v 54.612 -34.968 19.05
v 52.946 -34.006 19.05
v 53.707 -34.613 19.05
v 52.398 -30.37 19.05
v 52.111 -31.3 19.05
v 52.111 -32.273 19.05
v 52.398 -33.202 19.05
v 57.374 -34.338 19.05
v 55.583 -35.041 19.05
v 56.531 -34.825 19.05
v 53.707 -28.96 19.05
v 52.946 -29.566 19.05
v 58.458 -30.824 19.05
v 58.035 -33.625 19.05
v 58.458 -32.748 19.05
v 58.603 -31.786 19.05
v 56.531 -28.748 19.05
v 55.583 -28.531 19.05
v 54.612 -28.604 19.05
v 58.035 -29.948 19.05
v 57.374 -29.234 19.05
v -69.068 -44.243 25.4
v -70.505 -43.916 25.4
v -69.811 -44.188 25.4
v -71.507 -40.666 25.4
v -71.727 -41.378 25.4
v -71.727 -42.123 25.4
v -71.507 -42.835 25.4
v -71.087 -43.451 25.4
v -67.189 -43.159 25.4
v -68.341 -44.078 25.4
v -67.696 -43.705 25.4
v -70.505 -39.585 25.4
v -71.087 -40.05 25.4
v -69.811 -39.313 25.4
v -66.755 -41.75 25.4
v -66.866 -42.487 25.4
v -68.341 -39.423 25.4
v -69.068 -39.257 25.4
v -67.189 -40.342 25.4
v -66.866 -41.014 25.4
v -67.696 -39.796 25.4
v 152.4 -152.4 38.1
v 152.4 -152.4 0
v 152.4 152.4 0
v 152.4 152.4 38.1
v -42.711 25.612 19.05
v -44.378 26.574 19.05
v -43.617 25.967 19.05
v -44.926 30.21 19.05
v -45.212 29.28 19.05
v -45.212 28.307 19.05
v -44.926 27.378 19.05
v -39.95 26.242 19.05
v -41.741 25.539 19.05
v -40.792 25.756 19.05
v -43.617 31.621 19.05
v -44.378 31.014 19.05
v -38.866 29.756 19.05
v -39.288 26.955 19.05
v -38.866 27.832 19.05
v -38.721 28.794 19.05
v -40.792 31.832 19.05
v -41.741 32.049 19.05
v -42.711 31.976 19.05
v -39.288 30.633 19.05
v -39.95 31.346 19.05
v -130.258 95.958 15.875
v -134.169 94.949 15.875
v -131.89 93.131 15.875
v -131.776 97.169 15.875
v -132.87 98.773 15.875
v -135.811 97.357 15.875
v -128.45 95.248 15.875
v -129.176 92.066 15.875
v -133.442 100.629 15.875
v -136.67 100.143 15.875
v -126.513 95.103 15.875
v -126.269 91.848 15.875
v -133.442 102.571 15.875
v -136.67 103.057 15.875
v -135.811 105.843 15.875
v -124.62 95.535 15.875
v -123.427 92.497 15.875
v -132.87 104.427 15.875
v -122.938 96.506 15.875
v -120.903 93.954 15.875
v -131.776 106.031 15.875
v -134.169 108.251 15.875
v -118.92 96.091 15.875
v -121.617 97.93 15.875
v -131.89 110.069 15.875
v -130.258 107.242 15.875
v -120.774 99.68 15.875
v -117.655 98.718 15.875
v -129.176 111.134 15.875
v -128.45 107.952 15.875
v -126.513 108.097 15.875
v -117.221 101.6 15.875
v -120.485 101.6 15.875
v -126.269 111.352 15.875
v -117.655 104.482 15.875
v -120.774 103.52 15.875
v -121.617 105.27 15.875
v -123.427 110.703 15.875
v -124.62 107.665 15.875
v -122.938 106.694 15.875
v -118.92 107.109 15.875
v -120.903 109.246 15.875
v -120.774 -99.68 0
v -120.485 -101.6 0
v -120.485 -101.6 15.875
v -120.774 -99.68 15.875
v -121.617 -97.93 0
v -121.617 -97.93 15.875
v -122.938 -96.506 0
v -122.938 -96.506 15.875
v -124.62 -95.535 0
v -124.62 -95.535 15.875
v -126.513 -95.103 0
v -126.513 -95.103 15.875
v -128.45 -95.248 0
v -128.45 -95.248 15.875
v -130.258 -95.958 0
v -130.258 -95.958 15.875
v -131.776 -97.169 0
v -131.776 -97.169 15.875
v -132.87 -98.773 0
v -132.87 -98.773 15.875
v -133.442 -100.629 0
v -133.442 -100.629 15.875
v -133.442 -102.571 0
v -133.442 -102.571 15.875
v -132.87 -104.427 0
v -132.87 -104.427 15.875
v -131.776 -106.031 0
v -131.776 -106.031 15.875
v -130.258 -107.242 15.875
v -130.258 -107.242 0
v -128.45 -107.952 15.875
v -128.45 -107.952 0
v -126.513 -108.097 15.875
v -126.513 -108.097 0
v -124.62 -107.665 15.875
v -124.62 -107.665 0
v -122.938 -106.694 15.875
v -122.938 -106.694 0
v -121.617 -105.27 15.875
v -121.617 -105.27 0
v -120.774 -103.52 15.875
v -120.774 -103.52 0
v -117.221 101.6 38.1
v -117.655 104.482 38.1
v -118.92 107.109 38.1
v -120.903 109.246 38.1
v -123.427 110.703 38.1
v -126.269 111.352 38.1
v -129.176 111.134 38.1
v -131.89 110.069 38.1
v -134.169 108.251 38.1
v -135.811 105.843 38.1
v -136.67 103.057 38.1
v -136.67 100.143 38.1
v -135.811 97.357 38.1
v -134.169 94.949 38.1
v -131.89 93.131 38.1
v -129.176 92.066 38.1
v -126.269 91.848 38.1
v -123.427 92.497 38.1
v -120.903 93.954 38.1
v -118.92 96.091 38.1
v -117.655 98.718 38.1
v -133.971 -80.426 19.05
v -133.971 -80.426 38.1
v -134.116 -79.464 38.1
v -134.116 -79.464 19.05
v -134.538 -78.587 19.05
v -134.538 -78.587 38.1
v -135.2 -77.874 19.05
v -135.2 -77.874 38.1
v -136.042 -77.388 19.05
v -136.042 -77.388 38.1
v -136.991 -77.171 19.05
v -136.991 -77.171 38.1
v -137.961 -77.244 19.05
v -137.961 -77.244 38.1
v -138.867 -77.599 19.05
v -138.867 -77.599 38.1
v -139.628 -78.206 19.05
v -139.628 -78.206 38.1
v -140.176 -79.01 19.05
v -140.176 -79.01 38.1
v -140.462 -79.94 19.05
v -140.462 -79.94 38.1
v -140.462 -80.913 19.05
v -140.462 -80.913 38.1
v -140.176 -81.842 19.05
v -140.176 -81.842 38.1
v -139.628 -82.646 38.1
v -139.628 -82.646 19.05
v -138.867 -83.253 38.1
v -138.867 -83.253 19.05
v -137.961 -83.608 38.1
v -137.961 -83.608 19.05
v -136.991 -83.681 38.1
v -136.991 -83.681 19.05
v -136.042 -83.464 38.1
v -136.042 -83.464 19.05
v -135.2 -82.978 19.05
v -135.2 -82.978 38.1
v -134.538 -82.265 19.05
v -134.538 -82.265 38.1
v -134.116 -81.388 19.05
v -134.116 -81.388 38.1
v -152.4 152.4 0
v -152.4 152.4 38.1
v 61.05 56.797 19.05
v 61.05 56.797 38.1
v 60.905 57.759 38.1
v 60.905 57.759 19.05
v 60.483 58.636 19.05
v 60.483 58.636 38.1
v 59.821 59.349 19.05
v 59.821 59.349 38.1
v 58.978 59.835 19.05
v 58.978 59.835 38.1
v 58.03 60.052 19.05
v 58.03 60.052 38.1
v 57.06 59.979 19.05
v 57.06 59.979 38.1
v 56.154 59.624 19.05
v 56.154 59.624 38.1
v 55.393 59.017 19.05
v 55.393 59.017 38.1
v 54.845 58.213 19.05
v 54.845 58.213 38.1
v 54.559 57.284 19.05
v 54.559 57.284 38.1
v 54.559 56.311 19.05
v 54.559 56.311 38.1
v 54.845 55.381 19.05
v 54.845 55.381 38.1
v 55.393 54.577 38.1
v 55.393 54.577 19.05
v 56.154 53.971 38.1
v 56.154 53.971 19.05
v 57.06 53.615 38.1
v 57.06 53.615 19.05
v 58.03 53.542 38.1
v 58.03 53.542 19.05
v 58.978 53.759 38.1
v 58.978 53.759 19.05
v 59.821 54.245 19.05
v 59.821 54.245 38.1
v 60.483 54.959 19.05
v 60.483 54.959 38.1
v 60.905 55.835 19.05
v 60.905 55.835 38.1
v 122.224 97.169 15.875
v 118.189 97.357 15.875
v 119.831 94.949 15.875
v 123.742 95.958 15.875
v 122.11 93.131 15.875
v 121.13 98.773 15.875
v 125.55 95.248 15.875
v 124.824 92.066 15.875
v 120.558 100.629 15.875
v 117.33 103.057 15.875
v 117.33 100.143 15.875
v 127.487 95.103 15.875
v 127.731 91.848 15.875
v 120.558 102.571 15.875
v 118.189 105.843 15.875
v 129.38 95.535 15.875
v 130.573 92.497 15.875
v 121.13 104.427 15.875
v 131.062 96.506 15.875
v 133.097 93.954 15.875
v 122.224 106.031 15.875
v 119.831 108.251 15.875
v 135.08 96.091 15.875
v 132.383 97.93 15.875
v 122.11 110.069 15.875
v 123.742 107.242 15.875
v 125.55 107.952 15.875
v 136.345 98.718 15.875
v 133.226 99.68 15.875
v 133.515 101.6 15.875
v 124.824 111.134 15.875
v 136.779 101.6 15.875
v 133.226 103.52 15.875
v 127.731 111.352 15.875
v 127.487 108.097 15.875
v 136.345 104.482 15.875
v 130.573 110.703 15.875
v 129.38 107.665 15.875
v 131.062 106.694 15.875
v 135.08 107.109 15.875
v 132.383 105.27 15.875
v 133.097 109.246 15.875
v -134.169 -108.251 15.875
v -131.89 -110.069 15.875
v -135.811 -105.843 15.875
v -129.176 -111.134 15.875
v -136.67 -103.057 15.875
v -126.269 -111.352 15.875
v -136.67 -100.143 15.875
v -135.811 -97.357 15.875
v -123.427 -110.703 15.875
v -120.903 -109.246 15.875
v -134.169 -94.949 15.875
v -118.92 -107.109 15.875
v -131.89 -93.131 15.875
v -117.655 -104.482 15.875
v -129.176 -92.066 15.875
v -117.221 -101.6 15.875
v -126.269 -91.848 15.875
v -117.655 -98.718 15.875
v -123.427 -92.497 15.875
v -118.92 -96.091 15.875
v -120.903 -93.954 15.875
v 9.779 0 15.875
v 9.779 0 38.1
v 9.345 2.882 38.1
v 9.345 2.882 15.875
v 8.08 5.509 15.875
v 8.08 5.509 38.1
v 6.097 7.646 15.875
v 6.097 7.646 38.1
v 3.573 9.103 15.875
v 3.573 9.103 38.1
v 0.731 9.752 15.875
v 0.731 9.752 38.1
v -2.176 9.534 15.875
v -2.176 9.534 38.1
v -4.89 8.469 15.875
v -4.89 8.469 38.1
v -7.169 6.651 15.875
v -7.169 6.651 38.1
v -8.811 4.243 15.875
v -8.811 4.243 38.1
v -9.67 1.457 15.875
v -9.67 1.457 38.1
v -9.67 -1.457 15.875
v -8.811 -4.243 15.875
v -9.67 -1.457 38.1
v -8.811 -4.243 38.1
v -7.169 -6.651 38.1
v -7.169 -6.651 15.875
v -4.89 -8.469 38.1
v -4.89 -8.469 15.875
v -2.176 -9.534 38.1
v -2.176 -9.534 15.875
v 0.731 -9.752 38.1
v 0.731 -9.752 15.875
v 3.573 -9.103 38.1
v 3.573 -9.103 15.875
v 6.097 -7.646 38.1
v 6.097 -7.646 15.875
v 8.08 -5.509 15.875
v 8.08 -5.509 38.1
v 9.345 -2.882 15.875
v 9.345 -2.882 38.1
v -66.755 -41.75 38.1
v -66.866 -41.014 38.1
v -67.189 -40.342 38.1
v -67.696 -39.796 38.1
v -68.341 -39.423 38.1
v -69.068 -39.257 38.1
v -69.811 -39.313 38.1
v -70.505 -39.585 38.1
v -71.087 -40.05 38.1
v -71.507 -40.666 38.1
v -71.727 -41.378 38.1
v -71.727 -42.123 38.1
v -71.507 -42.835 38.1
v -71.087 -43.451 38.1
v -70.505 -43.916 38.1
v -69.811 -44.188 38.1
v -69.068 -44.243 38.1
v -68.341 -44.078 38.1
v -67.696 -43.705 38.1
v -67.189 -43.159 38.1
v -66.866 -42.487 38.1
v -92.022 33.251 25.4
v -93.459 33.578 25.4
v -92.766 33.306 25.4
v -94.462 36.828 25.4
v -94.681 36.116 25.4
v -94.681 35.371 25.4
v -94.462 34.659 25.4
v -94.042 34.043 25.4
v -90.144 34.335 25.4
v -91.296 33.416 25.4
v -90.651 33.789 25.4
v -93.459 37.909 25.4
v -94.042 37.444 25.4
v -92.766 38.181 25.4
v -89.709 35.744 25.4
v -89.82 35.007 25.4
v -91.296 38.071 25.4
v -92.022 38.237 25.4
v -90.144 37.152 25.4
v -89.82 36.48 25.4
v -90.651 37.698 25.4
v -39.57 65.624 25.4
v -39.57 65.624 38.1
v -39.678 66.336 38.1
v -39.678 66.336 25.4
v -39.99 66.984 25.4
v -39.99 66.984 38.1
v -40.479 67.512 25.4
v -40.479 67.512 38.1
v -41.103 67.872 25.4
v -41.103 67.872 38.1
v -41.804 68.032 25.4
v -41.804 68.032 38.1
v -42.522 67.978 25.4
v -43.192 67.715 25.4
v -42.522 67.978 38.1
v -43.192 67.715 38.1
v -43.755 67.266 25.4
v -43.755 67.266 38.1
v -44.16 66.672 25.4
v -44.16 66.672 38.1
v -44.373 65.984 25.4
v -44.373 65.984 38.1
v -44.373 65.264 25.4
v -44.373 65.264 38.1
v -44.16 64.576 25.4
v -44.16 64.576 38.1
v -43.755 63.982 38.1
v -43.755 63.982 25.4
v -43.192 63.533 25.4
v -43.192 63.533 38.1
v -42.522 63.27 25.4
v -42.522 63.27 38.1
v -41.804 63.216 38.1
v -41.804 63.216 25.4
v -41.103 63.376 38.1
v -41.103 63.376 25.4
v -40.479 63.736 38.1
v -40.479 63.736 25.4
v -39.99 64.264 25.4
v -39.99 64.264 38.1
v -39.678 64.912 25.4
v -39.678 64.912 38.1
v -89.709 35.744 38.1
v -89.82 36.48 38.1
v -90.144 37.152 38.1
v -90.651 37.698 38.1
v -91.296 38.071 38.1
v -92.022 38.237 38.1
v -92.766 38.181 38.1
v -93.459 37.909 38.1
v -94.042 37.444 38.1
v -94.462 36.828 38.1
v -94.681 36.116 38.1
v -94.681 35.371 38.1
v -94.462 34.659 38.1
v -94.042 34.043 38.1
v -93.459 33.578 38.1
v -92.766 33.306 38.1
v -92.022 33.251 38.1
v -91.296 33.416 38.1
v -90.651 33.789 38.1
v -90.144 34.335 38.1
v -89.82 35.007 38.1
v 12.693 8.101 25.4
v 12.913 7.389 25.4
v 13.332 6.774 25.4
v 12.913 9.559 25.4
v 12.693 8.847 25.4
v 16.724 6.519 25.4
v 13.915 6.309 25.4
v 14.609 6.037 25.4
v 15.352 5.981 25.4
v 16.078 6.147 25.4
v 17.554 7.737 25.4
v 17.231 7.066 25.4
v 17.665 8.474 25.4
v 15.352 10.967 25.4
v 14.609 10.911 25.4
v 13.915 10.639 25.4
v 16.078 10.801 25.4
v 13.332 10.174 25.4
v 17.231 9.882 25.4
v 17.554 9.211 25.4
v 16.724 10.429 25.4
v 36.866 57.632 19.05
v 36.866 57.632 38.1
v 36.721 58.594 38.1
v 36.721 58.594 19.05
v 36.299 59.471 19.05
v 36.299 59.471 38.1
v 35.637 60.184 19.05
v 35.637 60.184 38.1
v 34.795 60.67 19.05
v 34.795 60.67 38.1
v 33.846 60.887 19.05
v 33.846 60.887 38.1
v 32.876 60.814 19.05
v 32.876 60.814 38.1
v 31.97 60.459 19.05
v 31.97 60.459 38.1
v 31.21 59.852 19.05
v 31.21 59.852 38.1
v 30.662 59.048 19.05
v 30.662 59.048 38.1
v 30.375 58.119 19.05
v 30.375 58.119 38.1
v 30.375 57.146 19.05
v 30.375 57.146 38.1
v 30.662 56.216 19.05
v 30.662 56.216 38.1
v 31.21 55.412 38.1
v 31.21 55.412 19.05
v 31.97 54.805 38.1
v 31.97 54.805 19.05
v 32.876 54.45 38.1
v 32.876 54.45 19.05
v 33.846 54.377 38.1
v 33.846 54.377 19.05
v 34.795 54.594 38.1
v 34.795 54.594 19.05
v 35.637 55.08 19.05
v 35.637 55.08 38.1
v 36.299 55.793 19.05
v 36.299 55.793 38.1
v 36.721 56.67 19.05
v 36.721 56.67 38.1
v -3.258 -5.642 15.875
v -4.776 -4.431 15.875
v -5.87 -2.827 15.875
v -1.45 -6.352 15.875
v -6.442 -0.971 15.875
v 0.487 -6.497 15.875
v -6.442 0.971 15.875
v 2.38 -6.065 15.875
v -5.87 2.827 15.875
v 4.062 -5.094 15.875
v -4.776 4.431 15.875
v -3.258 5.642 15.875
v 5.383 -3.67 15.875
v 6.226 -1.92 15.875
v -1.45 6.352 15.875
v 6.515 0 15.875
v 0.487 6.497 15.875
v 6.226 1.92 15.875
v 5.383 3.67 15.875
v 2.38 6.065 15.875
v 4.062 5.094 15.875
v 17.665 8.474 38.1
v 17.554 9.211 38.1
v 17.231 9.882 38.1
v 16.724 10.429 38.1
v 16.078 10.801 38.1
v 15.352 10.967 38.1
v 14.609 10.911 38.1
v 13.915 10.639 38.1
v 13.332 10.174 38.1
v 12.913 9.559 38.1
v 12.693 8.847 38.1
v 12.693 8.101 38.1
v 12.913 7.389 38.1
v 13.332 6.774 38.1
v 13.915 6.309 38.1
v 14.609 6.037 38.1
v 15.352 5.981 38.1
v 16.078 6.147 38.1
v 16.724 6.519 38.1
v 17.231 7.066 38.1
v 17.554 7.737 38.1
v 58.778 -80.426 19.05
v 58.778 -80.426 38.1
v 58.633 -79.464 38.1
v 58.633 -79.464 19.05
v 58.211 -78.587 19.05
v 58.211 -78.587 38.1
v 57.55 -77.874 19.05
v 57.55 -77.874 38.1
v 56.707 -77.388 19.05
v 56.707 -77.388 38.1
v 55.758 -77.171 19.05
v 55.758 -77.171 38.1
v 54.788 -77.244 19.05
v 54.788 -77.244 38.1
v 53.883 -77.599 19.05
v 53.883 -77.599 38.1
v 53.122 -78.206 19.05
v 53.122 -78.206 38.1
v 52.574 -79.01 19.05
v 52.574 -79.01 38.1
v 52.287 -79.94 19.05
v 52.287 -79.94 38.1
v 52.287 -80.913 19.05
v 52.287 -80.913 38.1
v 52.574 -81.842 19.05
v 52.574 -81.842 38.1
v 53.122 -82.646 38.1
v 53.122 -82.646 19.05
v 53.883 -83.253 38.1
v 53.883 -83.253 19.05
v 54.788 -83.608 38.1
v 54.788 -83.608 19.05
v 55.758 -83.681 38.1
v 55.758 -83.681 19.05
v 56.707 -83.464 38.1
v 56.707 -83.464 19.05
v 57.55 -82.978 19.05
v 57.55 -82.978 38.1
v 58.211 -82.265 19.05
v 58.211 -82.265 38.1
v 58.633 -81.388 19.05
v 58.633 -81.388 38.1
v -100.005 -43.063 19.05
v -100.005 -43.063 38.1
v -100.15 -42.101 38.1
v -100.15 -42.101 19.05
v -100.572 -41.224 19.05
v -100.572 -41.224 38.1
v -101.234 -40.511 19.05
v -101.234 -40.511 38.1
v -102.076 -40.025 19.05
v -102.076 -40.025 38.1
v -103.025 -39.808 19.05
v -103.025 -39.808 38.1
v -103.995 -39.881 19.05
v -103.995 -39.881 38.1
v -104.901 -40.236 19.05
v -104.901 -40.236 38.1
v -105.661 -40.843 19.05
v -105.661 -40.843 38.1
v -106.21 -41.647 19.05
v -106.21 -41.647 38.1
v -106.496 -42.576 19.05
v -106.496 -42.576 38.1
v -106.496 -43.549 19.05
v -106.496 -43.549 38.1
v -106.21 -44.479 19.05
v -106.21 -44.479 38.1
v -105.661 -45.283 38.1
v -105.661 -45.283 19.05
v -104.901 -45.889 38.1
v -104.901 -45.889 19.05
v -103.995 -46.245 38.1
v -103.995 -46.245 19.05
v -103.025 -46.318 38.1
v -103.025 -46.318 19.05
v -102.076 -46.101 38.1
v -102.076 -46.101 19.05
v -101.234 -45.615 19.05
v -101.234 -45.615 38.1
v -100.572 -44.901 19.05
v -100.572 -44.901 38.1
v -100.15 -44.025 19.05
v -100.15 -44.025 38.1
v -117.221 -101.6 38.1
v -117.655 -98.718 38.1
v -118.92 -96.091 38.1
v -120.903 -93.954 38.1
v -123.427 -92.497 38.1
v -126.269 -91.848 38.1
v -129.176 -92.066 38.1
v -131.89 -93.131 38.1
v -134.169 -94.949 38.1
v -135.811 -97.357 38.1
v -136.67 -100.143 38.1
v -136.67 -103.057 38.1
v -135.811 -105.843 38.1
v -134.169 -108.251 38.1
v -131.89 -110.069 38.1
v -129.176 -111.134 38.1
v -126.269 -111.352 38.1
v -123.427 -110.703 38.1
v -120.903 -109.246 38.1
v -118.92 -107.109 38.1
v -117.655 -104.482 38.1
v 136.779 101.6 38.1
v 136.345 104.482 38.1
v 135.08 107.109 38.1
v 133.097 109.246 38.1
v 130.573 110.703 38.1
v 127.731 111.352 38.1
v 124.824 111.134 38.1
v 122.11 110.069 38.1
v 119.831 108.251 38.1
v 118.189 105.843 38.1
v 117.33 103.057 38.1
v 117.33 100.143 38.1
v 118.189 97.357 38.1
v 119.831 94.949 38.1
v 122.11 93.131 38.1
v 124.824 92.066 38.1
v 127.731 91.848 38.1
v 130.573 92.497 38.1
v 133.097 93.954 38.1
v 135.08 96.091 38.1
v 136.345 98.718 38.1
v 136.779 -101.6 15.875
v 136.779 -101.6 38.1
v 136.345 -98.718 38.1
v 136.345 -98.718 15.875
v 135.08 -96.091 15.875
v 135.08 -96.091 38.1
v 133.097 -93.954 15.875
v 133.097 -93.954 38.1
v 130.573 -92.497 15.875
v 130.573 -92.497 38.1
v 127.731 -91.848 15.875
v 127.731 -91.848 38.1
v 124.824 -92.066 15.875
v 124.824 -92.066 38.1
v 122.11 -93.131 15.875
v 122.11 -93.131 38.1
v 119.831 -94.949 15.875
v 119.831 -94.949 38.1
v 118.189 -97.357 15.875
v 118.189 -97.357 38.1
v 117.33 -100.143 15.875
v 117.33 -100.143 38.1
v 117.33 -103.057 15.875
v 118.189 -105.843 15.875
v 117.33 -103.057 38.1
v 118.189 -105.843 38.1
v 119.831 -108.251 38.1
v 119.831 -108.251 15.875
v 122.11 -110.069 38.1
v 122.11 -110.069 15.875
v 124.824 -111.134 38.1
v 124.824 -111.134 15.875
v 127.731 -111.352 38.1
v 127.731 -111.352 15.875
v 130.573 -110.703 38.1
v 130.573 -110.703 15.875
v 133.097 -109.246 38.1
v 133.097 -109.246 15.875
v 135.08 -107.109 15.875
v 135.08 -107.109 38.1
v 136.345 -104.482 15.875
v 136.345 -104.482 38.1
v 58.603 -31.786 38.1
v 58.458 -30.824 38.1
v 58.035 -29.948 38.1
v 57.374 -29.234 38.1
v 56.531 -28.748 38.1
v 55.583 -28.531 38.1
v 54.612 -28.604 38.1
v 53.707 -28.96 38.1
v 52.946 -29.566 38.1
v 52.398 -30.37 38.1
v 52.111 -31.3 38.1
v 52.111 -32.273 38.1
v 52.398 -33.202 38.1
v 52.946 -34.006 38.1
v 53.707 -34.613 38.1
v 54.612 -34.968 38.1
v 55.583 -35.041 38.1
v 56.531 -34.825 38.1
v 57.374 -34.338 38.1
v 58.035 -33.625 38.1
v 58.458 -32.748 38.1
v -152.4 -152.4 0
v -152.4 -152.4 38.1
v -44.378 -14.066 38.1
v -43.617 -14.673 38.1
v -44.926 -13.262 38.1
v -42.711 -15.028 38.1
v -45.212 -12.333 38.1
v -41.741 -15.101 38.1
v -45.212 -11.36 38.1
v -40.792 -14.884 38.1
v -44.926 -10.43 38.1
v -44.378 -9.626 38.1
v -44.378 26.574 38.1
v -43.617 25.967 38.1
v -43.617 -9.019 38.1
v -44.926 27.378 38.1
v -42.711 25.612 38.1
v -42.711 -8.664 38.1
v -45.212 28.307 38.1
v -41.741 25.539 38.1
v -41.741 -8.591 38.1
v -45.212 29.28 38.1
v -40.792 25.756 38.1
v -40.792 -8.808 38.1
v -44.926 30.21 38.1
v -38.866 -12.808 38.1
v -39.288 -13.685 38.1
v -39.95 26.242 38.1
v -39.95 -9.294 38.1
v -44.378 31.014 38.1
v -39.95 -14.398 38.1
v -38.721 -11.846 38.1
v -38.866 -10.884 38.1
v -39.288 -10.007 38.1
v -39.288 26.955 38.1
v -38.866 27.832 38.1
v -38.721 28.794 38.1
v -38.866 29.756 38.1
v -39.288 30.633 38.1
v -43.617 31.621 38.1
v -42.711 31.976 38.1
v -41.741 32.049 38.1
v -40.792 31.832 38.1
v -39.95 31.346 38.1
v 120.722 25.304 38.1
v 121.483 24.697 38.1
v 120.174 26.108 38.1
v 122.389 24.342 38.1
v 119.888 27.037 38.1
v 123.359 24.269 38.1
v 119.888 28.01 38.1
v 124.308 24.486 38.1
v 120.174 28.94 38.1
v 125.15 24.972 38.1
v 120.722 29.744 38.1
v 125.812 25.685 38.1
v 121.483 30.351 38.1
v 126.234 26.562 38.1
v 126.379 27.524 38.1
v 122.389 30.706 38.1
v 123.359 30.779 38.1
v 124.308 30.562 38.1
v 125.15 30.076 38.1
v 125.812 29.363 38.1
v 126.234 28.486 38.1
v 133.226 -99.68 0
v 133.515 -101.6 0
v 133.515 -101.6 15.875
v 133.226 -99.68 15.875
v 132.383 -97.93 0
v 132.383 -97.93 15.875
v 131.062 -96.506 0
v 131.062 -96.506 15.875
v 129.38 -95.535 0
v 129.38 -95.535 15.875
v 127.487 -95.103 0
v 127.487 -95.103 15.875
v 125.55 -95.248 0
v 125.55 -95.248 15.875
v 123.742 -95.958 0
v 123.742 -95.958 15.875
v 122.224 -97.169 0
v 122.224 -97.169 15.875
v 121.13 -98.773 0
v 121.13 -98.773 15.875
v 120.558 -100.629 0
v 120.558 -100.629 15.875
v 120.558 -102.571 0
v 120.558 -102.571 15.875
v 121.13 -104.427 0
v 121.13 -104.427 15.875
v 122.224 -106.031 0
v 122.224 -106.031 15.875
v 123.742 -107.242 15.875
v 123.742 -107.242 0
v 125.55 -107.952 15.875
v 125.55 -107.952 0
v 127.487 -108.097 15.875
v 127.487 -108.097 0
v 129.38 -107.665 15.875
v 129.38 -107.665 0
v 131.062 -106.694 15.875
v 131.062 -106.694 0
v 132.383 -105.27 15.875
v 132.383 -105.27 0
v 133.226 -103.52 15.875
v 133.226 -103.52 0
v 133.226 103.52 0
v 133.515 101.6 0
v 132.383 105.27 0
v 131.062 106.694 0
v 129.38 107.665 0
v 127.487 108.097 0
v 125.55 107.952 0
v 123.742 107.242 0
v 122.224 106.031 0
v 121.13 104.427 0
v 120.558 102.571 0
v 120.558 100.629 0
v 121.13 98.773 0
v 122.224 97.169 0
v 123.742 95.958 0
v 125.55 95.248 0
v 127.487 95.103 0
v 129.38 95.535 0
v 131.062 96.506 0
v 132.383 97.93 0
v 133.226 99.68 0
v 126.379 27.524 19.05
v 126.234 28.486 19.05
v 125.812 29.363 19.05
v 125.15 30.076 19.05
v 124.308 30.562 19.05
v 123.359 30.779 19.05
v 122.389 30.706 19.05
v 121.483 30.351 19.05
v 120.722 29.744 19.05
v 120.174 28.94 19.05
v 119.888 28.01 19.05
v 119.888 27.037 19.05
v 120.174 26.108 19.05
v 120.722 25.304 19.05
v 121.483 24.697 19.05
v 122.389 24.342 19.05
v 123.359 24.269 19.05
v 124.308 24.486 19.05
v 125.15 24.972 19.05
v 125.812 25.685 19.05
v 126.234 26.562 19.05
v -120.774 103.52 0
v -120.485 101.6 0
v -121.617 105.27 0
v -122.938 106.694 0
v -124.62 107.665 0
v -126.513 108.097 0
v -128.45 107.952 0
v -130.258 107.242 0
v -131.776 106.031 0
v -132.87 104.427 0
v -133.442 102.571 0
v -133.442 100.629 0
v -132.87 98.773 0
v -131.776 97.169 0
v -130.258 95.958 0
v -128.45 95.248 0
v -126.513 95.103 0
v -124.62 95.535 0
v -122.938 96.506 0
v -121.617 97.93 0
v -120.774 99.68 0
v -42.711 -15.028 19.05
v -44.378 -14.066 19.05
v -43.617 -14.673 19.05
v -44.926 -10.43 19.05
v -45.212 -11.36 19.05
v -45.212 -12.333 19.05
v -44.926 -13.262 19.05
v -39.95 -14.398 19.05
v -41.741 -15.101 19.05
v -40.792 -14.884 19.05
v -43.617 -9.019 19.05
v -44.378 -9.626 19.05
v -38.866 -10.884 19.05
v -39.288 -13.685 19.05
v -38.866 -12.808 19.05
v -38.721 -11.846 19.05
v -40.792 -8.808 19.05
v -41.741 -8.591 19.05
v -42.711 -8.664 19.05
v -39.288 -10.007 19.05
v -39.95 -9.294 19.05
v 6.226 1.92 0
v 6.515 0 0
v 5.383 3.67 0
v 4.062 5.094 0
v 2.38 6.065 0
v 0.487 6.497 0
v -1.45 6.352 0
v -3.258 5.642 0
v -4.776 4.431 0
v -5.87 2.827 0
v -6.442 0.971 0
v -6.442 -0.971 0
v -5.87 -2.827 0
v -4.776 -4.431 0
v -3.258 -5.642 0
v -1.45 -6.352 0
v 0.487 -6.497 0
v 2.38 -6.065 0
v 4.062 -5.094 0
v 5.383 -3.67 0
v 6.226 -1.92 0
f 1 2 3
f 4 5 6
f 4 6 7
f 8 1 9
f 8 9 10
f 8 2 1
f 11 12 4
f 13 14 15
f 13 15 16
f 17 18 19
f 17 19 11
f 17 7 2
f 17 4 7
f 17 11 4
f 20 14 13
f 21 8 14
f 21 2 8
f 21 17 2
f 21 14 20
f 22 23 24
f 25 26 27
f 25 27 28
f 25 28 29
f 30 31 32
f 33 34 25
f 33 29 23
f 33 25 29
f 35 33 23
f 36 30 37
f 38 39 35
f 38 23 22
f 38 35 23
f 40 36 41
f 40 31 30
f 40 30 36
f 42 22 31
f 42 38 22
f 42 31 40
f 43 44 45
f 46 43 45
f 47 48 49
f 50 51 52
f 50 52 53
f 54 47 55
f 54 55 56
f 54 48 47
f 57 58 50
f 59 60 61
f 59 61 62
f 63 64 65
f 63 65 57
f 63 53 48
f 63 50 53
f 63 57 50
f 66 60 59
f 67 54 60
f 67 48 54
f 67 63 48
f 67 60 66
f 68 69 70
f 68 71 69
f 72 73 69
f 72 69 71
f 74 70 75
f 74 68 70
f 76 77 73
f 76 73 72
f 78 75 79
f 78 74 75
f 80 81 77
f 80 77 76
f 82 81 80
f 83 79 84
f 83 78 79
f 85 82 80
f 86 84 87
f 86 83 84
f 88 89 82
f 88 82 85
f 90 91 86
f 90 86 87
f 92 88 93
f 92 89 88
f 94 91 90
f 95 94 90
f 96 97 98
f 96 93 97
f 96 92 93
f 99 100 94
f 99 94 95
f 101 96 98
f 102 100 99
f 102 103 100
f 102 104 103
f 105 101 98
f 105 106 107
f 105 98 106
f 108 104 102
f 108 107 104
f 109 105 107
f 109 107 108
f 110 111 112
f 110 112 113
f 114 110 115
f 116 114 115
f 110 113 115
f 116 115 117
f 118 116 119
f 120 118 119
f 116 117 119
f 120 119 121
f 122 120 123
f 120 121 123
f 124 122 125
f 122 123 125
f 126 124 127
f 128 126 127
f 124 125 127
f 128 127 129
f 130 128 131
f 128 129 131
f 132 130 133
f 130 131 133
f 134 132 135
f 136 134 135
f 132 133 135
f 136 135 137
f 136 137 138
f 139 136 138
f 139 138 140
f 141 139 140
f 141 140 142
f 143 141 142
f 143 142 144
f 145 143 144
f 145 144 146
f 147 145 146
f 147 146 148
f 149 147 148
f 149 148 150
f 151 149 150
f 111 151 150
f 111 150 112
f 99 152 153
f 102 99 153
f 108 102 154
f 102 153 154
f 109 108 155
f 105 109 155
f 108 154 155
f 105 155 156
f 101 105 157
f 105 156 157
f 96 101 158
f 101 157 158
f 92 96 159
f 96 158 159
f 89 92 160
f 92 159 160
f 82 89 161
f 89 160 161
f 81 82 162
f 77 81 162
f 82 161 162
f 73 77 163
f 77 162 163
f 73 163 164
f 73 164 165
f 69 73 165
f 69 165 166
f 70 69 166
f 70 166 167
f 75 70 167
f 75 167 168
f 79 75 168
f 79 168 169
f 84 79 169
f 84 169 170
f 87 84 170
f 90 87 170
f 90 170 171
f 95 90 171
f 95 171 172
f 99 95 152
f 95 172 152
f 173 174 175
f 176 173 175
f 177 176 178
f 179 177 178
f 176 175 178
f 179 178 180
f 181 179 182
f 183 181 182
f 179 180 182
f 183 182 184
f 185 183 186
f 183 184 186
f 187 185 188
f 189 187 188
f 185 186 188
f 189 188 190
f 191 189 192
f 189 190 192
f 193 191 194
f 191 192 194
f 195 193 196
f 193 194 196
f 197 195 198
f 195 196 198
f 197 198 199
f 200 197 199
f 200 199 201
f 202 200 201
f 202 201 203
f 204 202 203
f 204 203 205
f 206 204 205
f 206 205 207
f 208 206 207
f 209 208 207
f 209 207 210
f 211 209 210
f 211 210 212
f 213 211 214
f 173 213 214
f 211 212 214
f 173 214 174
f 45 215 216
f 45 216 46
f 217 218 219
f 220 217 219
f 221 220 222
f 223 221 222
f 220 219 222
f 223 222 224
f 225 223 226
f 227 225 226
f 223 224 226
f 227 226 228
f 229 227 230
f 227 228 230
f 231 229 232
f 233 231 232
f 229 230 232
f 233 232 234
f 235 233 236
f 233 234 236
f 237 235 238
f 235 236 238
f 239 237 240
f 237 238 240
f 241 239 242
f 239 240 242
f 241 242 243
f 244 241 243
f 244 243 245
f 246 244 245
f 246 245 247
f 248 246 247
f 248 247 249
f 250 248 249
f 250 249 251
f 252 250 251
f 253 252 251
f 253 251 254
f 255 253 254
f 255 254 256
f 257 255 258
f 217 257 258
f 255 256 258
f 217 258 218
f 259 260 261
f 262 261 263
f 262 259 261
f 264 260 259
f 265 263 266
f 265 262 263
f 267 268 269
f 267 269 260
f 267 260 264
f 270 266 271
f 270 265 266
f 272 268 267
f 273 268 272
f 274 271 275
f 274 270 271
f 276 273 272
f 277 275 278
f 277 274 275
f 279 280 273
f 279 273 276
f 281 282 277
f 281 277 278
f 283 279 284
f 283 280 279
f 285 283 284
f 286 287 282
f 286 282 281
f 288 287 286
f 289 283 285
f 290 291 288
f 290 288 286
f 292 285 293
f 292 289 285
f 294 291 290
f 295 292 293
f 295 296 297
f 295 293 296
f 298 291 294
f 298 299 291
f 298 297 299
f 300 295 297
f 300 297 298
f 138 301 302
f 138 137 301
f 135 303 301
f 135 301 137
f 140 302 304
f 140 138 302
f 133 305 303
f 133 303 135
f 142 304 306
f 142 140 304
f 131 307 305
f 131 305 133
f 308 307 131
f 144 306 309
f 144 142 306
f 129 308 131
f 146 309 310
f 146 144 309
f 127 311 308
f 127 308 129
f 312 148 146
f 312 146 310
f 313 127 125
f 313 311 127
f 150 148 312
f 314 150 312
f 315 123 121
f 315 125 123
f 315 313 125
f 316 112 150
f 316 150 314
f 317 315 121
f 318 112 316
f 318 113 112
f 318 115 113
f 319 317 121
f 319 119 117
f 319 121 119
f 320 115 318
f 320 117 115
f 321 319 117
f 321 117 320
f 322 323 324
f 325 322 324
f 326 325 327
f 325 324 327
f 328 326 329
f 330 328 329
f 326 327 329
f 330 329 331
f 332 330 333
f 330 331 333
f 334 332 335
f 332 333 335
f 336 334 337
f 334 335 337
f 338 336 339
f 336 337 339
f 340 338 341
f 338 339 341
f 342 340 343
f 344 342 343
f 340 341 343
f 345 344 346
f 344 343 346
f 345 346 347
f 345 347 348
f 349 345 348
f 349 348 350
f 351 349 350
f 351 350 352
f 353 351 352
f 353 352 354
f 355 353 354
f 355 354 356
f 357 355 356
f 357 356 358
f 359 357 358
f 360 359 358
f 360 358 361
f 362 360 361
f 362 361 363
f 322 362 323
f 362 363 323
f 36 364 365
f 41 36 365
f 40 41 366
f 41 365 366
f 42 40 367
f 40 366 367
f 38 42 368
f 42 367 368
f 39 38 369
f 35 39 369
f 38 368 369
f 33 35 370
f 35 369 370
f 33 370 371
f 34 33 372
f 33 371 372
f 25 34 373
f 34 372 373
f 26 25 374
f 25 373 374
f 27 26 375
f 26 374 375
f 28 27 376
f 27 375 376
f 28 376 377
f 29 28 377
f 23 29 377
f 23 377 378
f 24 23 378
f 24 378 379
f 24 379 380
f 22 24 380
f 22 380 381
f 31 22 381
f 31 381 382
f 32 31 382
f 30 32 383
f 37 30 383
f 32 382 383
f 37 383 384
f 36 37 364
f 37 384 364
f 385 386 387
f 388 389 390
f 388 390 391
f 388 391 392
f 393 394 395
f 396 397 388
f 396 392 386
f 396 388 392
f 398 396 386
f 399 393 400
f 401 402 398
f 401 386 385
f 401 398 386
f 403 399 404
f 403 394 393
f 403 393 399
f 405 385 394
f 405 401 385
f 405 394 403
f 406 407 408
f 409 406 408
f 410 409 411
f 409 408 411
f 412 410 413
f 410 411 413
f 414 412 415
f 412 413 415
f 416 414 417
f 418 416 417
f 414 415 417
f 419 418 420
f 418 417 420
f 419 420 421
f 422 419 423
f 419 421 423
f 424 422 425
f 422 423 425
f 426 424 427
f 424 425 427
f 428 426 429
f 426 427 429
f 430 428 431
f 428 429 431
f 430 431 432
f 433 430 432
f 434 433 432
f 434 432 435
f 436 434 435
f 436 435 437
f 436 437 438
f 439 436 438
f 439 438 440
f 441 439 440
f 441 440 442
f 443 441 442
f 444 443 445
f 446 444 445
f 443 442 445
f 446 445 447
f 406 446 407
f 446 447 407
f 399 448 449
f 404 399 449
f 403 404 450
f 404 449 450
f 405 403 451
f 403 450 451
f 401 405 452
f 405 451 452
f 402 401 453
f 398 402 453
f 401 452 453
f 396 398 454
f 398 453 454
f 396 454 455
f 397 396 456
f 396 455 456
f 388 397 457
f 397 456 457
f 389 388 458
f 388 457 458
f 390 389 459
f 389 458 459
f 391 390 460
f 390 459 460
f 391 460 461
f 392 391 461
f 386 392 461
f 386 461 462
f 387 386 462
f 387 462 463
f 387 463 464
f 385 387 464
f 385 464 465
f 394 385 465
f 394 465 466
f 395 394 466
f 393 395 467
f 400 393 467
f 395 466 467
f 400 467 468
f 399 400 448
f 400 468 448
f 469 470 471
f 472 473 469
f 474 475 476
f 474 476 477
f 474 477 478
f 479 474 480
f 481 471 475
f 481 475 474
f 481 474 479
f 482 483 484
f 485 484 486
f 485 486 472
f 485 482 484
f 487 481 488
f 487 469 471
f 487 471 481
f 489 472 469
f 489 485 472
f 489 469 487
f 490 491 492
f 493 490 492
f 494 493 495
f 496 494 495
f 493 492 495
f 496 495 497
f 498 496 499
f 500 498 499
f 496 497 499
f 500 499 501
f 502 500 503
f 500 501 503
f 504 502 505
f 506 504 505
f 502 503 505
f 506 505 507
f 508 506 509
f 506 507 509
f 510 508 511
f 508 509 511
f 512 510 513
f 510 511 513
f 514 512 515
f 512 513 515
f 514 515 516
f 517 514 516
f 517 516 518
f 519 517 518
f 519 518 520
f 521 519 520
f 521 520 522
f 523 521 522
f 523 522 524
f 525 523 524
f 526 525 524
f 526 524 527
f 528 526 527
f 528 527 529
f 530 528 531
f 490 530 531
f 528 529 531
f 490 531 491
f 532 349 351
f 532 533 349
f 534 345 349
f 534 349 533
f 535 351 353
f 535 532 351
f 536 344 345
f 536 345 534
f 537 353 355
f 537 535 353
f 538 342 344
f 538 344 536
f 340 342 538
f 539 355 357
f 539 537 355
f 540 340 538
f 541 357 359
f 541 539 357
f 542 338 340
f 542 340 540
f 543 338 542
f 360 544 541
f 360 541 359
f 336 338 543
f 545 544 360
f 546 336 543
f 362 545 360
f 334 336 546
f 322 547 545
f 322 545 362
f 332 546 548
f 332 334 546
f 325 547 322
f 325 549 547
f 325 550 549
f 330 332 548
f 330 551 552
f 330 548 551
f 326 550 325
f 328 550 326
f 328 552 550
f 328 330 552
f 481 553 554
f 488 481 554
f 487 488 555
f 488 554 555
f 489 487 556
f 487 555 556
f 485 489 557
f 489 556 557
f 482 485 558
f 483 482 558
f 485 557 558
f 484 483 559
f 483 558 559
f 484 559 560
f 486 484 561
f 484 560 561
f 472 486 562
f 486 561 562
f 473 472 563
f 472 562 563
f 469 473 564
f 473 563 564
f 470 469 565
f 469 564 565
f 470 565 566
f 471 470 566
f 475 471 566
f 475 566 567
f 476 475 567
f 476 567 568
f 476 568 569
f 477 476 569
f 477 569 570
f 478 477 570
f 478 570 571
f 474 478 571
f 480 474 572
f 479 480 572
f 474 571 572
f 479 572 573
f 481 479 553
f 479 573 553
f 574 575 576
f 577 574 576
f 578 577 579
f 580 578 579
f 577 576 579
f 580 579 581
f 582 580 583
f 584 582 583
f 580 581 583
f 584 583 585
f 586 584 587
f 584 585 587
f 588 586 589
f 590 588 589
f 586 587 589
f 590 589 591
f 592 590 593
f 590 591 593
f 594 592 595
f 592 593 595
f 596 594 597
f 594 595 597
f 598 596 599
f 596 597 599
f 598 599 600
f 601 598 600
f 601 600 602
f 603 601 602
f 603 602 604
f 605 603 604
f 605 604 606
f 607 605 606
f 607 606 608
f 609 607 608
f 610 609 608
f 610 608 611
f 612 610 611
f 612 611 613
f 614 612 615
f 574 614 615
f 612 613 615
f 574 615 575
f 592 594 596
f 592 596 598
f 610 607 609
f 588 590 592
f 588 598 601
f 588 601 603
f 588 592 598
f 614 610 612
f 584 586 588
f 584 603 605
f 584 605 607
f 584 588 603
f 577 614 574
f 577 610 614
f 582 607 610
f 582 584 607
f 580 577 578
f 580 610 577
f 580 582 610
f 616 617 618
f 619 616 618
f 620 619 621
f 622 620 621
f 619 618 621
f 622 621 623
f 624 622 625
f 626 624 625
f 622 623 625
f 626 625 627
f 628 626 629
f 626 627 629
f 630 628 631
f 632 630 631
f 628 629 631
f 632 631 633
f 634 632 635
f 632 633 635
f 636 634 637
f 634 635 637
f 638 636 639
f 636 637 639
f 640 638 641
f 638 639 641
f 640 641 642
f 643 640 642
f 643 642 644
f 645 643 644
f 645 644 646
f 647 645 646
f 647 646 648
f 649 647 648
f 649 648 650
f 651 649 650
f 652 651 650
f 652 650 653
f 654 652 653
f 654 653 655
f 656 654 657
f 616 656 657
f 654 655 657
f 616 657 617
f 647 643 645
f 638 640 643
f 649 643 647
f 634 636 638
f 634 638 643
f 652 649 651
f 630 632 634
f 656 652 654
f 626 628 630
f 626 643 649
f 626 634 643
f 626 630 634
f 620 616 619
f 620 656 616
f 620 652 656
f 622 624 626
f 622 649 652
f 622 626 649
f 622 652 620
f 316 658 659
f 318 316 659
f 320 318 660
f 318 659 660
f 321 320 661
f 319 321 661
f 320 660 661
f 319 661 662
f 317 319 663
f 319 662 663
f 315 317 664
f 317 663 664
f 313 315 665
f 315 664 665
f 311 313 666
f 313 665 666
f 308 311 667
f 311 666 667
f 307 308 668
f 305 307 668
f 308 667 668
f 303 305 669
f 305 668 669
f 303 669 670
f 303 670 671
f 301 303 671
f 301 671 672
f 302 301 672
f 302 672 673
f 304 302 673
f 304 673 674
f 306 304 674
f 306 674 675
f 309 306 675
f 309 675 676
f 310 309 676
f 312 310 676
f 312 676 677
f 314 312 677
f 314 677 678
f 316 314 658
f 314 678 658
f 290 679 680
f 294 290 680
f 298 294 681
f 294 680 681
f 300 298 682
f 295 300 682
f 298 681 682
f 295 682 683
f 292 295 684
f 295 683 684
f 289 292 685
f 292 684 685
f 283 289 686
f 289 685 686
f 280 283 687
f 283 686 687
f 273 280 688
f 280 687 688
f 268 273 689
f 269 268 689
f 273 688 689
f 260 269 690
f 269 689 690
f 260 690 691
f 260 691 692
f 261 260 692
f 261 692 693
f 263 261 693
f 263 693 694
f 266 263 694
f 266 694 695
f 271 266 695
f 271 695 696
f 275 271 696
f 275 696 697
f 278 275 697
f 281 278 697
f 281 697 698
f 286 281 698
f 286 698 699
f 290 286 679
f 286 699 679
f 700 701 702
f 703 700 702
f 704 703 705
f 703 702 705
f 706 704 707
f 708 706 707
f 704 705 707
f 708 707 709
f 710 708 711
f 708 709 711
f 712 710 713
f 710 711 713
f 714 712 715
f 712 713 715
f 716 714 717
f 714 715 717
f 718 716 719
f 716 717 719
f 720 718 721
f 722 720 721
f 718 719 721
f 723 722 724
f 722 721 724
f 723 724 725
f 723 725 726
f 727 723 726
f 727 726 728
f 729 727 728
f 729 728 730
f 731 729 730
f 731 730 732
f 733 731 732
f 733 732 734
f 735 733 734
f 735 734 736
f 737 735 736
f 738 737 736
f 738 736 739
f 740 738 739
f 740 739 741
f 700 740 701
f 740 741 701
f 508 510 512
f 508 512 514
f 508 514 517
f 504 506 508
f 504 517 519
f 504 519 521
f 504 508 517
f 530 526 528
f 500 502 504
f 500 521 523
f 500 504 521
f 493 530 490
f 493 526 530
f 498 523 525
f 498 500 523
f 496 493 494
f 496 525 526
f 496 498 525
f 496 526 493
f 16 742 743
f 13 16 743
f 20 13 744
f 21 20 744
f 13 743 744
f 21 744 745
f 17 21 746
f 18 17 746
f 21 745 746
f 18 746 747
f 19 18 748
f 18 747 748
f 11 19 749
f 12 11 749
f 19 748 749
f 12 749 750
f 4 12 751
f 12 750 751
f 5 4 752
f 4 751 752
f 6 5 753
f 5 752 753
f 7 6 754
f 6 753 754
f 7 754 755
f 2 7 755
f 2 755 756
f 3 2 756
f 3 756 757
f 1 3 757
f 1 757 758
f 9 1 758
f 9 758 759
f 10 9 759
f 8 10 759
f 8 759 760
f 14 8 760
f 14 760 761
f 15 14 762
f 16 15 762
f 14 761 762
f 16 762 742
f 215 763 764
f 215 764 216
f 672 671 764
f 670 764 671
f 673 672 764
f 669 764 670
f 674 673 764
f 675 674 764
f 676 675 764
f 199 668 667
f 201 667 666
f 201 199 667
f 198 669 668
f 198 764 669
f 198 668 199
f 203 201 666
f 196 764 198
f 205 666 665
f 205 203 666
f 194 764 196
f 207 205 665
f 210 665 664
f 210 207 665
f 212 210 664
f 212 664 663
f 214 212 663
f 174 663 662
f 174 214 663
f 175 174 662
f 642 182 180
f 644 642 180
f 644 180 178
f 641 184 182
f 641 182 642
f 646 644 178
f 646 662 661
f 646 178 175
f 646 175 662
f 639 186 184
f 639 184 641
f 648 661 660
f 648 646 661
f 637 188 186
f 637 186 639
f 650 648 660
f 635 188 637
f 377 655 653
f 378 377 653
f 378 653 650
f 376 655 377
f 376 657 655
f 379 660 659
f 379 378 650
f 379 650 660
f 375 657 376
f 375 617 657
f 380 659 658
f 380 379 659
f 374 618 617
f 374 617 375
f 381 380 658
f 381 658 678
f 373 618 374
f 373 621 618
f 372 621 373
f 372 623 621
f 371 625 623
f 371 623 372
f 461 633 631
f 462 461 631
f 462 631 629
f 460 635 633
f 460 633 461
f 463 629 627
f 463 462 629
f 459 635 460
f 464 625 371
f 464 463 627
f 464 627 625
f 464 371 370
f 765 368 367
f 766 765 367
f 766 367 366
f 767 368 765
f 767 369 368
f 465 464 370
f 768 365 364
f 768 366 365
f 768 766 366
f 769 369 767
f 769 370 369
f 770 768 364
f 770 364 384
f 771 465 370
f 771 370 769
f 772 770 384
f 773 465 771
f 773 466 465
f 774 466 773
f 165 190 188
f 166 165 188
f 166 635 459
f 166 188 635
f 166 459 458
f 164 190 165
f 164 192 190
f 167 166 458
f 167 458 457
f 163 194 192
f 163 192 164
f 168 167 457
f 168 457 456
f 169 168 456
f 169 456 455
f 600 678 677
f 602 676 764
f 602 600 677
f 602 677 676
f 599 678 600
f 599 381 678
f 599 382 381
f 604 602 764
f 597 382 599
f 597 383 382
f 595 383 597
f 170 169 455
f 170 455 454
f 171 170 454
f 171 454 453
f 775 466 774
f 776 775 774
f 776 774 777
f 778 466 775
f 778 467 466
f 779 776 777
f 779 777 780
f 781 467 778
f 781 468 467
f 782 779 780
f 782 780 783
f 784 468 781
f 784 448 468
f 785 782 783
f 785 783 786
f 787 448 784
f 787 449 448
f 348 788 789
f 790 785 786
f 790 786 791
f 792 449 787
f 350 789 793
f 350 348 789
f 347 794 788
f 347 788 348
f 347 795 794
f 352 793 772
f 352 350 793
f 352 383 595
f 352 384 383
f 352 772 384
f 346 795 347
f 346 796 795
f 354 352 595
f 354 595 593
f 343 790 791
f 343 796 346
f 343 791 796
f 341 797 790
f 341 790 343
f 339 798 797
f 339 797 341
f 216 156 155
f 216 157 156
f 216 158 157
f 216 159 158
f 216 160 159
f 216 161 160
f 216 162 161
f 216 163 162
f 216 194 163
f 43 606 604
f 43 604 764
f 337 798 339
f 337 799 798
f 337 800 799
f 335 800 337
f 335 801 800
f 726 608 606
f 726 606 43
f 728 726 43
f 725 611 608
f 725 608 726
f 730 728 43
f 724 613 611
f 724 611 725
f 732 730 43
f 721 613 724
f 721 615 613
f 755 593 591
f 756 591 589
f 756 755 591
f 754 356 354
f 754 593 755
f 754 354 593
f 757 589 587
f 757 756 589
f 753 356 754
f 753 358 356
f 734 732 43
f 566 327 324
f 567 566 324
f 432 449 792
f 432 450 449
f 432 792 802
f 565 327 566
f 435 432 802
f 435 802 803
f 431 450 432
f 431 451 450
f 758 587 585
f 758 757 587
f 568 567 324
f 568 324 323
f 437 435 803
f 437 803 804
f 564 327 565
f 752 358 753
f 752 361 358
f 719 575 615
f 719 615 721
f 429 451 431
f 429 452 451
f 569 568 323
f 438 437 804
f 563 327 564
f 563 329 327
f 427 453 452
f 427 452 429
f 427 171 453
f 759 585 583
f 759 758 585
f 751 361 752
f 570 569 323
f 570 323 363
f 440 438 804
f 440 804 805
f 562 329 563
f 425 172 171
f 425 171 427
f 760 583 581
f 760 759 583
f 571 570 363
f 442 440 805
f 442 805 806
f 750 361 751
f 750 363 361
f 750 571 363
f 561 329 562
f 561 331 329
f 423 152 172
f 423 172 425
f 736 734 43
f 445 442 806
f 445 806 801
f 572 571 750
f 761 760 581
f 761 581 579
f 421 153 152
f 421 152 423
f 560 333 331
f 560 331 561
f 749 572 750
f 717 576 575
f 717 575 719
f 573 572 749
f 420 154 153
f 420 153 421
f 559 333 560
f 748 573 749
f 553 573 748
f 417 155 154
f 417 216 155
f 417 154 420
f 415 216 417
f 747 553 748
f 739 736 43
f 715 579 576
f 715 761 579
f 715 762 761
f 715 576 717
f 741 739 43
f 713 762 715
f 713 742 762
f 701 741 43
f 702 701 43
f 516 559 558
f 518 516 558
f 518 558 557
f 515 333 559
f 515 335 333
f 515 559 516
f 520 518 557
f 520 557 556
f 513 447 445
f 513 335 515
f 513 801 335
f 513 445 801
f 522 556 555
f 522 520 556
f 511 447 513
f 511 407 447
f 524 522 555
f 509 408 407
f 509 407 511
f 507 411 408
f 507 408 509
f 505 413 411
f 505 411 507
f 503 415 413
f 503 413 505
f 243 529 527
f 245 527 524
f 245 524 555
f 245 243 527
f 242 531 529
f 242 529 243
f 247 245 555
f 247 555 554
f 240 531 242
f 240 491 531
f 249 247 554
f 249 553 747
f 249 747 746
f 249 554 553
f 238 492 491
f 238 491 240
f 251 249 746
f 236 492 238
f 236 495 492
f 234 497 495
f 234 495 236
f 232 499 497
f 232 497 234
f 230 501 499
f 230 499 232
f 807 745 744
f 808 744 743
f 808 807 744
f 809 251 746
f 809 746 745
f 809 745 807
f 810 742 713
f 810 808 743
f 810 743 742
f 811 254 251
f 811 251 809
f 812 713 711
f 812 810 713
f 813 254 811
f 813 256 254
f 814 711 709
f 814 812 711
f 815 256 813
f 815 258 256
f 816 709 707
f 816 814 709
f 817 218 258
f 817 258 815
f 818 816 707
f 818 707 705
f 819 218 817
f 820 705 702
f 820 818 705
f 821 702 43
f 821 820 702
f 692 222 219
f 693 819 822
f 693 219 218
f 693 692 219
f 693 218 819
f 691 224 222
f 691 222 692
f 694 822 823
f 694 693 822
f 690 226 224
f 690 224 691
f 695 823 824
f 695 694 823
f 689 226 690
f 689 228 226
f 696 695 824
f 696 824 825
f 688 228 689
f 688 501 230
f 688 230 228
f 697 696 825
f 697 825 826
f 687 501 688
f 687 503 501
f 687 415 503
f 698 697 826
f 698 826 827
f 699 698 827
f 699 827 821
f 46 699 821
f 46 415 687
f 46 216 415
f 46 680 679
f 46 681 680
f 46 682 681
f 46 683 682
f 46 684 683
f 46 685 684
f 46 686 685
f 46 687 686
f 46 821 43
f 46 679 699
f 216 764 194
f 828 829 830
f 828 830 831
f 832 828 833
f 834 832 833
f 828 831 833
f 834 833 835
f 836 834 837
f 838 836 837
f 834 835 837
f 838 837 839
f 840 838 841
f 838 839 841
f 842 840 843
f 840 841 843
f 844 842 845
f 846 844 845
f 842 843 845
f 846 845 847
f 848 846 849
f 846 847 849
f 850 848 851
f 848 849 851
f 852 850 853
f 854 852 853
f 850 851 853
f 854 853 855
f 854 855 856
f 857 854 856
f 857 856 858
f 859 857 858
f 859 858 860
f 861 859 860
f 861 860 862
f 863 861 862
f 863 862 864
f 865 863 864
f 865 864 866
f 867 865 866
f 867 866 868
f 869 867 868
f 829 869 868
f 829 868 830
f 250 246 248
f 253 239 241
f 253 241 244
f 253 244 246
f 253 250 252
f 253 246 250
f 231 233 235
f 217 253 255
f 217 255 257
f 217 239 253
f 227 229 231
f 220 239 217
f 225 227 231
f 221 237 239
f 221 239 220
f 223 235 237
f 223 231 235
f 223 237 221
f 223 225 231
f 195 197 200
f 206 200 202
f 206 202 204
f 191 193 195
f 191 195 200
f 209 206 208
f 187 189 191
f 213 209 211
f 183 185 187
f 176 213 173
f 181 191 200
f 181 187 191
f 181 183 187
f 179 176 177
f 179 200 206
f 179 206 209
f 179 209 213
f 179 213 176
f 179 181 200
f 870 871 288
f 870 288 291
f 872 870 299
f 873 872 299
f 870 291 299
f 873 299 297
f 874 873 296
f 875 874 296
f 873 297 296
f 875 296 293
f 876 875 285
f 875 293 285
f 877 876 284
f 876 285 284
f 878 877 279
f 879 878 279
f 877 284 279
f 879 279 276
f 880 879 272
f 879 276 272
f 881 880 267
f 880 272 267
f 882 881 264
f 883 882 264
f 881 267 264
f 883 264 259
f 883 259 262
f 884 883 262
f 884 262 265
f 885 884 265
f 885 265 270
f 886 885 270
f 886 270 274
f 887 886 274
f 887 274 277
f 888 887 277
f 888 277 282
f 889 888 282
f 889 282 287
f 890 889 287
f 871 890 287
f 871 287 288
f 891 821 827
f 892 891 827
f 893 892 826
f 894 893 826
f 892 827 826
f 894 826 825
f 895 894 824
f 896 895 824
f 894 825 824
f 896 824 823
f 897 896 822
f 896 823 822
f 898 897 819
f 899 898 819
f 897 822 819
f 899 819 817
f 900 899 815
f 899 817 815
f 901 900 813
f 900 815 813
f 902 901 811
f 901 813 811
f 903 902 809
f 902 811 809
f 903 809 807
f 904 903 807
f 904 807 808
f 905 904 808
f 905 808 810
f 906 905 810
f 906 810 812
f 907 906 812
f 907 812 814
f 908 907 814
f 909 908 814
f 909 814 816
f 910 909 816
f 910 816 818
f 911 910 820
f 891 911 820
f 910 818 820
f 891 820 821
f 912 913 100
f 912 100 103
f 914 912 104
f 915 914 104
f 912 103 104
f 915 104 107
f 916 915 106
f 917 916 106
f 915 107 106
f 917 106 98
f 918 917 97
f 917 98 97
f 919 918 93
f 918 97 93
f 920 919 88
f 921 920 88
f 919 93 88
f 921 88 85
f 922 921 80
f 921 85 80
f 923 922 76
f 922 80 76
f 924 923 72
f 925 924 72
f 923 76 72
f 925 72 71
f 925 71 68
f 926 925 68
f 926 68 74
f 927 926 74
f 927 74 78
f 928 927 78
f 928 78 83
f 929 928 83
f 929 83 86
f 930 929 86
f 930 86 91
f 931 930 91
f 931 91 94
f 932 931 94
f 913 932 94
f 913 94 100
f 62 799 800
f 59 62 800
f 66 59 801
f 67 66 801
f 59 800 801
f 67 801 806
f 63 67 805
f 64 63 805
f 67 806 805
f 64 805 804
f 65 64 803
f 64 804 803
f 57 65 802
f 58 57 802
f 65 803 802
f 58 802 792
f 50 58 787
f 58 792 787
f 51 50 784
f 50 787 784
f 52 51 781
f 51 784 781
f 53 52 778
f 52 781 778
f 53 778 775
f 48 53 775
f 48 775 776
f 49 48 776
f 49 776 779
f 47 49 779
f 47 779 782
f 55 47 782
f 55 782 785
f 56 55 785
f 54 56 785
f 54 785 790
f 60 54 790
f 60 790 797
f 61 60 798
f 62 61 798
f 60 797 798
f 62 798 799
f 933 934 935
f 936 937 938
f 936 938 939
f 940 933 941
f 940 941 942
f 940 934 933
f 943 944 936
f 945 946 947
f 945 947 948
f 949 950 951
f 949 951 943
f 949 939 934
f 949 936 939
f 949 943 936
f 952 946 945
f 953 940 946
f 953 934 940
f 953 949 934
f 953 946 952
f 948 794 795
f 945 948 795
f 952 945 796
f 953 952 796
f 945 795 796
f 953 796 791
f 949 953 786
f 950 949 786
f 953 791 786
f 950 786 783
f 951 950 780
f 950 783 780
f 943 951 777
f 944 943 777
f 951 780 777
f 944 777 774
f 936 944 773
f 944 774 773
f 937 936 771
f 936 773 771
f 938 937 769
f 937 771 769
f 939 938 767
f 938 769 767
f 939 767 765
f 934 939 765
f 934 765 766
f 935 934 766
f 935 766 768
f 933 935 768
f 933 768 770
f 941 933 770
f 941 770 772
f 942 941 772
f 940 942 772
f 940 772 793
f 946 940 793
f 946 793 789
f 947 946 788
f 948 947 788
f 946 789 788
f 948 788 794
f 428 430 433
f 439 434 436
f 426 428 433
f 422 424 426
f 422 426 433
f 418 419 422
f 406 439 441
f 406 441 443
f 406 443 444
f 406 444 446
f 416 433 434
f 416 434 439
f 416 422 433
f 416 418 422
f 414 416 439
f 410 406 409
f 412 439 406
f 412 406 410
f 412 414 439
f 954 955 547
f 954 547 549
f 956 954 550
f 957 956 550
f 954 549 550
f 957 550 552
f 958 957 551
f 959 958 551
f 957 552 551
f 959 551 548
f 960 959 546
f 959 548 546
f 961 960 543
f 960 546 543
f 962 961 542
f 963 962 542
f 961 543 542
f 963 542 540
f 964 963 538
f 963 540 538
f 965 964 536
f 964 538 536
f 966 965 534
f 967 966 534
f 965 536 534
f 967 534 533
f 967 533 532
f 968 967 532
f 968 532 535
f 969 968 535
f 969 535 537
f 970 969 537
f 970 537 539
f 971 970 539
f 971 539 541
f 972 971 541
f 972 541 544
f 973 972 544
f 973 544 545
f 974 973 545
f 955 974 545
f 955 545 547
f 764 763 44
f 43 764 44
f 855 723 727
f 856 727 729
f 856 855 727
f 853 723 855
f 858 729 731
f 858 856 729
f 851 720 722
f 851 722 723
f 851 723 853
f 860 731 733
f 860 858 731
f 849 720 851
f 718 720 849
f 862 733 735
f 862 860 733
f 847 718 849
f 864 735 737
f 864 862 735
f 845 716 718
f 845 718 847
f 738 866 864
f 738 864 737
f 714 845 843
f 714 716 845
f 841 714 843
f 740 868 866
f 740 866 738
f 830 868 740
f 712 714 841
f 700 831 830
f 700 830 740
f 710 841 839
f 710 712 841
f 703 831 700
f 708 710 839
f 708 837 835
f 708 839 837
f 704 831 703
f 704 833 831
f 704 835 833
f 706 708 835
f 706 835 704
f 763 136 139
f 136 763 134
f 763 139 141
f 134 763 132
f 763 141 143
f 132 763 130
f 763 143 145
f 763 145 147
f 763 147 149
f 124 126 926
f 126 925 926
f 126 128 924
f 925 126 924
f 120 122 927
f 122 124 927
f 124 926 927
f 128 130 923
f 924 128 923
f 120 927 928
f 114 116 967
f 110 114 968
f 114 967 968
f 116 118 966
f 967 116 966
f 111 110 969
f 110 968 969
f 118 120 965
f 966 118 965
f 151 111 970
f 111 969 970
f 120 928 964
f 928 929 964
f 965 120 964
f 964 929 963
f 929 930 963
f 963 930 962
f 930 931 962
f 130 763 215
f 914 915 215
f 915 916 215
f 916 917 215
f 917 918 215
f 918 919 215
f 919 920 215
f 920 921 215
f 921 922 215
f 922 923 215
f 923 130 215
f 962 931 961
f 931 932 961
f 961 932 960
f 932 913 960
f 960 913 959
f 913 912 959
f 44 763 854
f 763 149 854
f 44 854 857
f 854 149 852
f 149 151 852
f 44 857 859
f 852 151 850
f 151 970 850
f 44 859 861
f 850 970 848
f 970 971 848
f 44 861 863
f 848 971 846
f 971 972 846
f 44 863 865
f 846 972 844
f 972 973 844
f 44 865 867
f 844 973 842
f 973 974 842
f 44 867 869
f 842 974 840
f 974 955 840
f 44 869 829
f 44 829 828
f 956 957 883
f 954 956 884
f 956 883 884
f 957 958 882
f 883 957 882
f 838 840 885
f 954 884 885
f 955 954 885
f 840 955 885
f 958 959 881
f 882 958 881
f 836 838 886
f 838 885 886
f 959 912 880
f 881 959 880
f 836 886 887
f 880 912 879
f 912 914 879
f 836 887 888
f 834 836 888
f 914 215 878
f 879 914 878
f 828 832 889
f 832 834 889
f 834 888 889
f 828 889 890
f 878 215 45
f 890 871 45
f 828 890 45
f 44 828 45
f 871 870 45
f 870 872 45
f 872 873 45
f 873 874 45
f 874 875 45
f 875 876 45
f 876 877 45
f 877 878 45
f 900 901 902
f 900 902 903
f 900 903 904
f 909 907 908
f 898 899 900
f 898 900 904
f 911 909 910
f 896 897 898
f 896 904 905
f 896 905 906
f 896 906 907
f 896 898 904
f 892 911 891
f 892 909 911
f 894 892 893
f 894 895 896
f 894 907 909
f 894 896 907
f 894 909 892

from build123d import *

# Parameters (mm, degrees)
SKETCH1_W                = 304.8
SKETCH1_H                = 304.8
BOSS_EXTRUDE1_DEPTH      = 38.1
SKETCH2_R                = 6.5151
HAAS_T_SLOT_HOLES_DEPTH  = 219.867836833
SKETCH3_R                = 9.779
HAAS_COUNTER_BORES_DEPTH = 22.225
SKETCH4_R                = 3.2639
CUT_EXTRUDE1_DEPTH       = 19.05
SKETCH5_R                = 2.414626773
SKETCH5_R_2              = 2.5
CUT_EXTRUDE2_DEPTH       = 12.7


with BuildPart() as part:
    # Sketch1 → Boss-Extrude1 (new body)
    with BuildSketch(Plane.XY):
        Rectangle(SKETCH1_W, SKETCH1_H)
    extrude(amount=BOSS_EXTRUDE1_DEPTH)

    # Sketch2 → HAAS T-Slot Holes (cut, through all)
    with BuildSketch(Plane.XY.offset(38.1)):
        with Locations((-127, 101.6)):
            Circle(SKETCH2_R)
        with Locations((127, 101.6)):
            Circle(SKETCH2_R)
        with Locations((127, -101.6)):
            Circle(SKETCH2_R)
        with Locations((-127, -101.6)):
            Circle(SKETCH2_R)
        Circle(SKETCH2_R)
    extrude(amount=-HAAS_T_SLOT_HOLES_DEPTH, mode=Mode.SUBTRACT)

    # Sketch3 → HAAS Counter Bores (cut)
    with BuildSketch(Plane.XY.offset(38.1)):
        with Locations((-127, 101.6)):
            Circle(SKETCH3_R)
        with Locations((127, 101.6)):
            Circle(SKETCH3_R)
        Circle(SKETCH3_R)
        with Locations((127, -101.6)):
            Circle(SKETCH3_R)
        with Locations((-127, -101.6)):
            Circle(SKETCH3_R)
    extrude(amount=-HAAS_COUNTER_BORES_DEPTH, mode=Mode.SUBTRACT)

    # Sketch4 → Cut-Extrude1 (cut)
    with BuildSketch(Plane.XY.offset(38.1)):
        with Locations((55.338636384, -31.78626265)):
            Circle(SKETCH4_R)
        with Locations((-103.268864702, -43.062839234)):
            Circle(SKETCH4_R)
        with Locations((-41.984915865, -11.846060915)):
            Circle(SKETCH4_R)
        with Locations((-41.984915865, 28.793939085)):
            Circle(SKETCH4_R)
        with Locations((123.115084135, 27.523939085)):
            Circle(SKETCH4_R)
        with Locations((-137.234915865, -80.426060915)):
            Circle(SKETCH4_R)
        with Locations((55.514563309, -80.426060915)):
            Circle(SKETCH4_R)
        with Locations((33.602258032, 57.632075165)):
            Circle(SKETCH4_R)
        with Locations((57.786056257, 56.797137583)):
            Circle(SKETCH4_R)
    extrude(amount=-CUT_EXTRUDE1_DEPTH, mode=Mode.SUBTRACT)

    # Sketch5 → Cut-Extrude2 (cut)
    with BuildSketch(Plane.XY.offset(38.1)):
        with Locations((-41.984915865, 65.623939085)):
            Circle(SKETCH5_R)
        with Locations((-92.209313854, 35.743562234)):
            Circle(SKETCH5_R_2)
        with Locations((-69.254539014, -41.750458903)):
            Circle(SKETCH5_R_2)
        with Locations((15.165084135, 8.473939085)):
            Circle(SKETCH5_R_2)
    extrude(amount=-CUT_EXTRUDE2_DEPTH, mode=Mode.SUBTRACT)


solid = part.part
